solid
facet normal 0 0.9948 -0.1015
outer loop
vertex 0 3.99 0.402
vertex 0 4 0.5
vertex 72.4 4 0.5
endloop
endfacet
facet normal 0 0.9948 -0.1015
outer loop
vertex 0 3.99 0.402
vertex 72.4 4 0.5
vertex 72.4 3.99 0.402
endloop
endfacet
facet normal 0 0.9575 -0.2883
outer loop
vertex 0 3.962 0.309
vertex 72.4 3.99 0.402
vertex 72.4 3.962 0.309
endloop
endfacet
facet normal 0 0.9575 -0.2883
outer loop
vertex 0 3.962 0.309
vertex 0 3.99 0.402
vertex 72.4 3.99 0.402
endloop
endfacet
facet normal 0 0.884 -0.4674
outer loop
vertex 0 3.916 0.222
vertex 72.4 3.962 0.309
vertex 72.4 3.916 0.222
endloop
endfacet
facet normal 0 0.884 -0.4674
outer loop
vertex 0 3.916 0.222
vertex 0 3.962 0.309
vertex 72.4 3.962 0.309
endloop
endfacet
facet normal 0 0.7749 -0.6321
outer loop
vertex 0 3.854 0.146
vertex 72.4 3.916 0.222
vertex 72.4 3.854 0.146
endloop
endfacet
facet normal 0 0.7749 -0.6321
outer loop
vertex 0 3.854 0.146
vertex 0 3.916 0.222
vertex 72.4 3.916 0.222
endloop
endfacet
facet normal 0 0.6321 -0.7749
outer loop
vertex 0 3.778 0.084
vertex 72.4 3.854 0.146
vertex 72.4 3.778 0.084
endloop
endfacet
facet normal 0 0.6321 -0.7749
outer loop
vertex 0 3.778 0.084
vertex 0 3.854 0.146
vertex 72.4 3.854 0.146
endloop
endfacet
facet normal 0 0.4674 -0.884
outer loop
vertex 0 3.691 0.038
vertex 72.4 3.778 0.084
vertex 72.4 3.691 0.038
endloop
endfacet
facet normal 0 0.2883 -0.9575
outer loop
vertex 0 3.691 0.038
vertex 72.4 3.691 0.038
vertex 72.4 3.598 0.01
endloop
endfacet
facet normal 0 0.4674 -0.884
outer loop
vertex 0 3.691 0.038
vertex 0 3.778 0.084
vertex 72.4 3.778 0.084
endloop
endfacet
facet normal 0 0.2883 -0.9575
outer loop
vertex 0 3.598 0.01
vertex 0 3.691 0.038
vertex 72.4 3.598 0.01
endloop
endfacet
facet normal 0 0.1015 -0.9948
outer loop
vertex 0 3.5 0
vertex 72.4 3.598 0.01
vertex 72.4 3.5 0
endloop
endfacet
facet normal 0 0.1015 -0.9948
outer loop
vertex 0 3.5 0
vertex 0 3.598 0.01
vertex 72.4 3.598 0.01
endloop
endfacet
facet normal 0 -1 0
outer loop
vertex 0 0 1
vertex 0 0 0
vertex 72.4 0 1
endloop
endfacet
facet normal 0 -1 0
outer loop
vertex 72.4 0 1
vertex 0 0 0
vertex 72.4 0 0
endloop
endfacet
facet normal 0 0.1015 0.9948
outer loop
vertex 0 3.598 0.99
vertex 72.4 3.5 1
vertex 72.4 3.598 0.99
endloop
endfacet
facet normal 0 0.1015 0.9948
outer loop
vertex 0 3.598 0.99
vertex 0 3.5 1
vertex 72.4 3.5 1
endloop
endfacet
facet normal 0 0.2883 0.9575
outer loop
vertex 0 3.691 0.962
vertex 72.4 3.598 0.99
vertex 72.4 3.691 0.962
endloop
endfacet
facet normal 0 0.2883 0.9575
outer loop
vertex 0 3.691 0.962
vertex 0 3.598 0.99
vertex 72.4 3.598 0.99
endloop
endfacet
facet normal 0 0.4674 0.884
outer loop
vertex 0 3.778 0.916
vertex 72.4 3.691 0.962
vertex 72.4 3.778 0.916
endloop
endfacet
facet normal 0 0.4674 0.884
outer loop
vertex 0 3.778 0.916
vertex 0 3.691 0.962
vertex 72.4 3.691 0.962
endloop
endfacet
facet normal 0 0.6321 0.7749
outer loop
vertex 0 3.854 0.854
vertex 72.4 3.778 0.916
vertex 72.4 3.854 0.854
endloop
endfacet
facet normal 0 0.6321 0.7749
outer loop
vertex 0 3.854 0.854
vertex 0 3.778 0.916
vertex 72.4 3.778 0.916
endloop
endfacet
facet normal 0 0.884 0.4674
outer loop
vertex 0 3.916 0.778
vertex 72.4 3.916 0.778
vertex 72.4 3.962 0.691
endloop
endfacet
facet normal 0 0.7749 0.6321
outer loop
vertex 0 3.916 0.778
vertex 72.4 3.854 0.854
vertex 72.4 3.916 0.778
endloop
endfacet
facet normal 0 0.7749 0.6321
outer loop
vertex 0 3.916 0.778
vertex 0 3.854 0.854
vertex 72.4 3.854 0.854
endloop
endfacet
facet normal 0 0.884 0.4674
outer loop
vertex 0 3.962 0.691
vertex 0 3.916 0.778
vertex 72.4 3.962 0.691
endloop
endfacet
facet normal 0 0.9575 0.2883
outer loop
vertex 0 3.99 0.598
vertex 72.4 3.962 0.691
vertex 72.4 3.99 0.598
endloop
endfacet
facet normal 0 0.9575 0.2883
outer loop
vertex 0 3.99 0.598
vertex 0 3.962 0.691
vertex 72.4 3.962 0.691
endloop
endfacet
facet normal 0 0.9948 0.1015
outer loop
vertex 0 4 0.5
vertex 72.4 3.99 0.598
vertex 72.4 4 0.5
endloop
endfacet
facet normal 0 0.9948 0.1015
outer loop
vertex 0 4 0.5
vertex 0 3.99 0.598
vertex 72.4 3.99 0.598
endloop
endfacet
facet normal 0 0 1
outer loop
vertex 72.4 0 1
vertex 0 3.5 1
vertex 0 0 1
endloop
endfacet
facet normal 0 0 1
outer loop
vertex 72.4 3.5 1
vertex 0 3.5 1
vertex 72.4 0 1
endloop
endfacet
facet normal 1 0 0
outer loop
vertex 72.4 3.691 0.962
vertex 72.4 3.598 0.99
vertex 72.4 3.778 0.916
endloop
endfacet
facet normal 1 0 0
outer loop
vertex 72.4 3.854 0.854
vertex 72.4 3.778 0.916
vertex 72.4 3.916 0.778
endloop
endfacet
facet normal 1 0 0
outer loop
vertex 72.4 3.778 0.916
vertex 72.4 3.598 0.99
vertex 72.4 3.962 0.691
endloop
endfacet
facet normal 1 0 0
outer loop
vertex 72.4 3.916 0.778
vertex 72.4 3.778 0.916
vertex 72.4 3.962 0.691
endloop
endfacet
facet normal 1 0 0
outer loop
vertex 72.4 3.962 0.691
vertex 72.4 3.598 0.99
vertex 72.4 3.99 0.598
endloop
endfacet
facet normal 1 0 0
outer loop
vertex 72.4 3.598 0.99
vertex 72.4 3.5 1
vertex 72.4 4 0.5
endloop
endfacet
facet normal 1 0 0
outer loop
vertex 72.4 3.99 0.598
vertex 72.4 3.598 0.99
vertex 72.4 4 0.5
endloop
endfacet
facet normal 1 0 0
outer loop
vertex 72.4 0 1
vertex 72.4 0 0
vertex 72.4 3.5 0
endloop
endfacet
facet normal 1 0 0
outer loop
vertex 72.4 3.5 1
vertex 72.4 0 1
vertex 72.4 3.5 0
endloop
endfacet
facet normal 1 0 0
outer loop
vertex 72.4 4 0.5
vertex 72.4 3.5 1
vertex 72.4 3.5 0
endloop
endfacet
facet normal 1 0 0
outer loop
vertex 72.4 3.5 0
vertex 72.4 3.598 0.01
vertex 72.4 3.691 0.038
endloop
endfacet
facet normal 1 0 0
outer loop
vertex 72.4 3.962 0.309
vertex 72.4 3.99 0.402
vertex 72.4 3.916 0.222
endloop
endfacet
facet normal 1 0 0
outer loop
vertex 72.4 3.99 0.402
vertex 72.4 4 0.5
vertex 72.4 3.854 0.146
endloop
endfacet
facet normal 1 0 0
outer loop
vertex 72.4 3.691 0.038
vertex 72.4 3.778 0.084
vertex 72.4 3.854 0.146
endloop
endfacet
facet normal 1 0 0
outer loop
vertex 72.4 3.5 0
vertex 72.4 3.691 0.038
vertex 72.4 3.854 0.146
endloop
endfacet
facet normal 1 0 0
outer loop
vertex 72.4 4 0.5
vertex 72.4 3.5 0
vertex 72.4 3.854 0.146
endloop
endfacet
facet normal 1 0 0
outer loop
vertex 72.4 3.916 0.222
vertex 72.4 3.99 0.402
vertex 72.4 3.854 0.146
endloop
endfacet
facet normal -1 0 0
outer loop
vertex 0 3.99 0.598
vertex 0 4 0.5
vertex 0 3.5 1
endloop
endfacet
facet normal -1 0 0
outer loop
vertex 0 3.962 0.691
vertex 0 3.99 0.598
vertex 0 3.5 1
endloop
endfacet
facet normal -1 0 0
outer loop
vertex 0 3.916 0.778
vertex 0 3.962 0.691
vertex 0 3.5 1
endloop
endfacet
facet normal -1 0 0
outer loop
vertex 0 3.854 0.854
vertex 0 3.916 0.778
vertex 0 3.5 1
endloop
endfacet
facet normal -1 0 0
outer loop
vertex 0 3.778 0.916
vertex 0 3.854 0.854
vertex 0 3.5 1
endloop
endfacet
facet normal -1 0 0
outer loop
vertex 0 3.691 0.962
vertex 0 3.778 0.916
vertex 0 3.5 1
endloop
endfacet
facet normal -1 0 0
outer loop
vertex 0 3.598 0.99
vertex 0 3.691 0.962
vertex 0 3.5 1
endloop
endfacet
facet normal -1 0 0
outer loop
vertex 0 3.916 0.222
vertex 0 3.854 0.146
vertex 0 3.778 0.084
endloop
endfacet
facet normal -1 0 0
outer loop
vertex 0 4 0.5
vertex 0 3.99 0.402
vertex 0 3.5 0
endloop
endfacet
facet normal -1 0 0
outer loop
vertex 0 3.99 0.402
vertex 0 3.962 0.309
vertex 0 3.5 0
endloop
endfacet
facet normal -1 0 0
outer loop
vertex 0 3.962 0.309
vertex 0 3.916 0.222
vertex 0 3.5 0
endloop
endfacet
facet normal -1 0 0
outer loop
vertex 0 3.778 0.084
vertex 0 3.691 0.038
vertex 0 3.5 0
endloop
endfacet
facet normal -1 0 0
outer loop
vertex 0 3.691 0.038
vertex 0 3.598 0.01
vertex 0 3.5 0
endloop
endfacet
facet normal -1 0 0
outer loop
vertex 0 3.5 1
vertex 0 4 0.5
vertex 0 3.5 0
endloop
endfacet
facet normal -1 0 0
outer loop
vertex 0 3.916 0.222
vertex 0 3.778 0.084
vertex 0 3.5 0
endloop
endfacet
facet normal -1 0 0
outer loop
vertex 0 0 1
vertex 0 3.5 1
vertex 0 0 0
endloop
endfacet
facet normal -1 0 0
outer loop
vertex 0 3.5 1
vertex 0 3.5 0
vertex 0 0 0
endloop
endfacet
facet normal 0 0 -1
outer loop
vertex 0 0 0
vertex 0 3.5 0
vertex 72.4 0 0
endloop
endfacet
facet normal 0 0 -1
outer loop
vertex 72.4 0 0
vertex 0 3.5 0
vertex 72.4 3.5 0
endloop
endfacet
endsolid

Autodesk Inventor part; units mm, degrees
ref_plane "YZ Plane" through (0, 0, 0) normal (1, 0, 0) x (0, 1, 0)
ref_plane "XZ Plane" through (0, 0, 0) normal (0, 1, 0) x (-1, 0, 0)
ref_plane "XY Plane" through (0, 0, 0) normal (0, 0, 1) x (1, 0, 0)
sketch "Szkic1" plane through (0, 0, 0) normal (0, 0, 1) x (1, 0, 0)
  line L0 (0, -0.8) -> (0, 4.8) construction
  line L1 (-14.48, 0) -> (86.88, 0) construction
  line L2 (0, 0) -> (72.4, 0)
  line L3 (72.4, 0) -> (72.4, 4)
  line L4 (72.4, 4) -> (0, 4)
  line L5 (0, 4) -> (0, 0)
  dimension "d0" = 4
  dimension "d1" = 72.4
extrude "Wyciągnięcie proste1" add sketch "Szkic1" along normal blind 1
fillet "Zaokrąglenie1" radius 0.5 2 edges at (36.2, 4, 1) (36.2, 4, 0)
properties part number "belka"
